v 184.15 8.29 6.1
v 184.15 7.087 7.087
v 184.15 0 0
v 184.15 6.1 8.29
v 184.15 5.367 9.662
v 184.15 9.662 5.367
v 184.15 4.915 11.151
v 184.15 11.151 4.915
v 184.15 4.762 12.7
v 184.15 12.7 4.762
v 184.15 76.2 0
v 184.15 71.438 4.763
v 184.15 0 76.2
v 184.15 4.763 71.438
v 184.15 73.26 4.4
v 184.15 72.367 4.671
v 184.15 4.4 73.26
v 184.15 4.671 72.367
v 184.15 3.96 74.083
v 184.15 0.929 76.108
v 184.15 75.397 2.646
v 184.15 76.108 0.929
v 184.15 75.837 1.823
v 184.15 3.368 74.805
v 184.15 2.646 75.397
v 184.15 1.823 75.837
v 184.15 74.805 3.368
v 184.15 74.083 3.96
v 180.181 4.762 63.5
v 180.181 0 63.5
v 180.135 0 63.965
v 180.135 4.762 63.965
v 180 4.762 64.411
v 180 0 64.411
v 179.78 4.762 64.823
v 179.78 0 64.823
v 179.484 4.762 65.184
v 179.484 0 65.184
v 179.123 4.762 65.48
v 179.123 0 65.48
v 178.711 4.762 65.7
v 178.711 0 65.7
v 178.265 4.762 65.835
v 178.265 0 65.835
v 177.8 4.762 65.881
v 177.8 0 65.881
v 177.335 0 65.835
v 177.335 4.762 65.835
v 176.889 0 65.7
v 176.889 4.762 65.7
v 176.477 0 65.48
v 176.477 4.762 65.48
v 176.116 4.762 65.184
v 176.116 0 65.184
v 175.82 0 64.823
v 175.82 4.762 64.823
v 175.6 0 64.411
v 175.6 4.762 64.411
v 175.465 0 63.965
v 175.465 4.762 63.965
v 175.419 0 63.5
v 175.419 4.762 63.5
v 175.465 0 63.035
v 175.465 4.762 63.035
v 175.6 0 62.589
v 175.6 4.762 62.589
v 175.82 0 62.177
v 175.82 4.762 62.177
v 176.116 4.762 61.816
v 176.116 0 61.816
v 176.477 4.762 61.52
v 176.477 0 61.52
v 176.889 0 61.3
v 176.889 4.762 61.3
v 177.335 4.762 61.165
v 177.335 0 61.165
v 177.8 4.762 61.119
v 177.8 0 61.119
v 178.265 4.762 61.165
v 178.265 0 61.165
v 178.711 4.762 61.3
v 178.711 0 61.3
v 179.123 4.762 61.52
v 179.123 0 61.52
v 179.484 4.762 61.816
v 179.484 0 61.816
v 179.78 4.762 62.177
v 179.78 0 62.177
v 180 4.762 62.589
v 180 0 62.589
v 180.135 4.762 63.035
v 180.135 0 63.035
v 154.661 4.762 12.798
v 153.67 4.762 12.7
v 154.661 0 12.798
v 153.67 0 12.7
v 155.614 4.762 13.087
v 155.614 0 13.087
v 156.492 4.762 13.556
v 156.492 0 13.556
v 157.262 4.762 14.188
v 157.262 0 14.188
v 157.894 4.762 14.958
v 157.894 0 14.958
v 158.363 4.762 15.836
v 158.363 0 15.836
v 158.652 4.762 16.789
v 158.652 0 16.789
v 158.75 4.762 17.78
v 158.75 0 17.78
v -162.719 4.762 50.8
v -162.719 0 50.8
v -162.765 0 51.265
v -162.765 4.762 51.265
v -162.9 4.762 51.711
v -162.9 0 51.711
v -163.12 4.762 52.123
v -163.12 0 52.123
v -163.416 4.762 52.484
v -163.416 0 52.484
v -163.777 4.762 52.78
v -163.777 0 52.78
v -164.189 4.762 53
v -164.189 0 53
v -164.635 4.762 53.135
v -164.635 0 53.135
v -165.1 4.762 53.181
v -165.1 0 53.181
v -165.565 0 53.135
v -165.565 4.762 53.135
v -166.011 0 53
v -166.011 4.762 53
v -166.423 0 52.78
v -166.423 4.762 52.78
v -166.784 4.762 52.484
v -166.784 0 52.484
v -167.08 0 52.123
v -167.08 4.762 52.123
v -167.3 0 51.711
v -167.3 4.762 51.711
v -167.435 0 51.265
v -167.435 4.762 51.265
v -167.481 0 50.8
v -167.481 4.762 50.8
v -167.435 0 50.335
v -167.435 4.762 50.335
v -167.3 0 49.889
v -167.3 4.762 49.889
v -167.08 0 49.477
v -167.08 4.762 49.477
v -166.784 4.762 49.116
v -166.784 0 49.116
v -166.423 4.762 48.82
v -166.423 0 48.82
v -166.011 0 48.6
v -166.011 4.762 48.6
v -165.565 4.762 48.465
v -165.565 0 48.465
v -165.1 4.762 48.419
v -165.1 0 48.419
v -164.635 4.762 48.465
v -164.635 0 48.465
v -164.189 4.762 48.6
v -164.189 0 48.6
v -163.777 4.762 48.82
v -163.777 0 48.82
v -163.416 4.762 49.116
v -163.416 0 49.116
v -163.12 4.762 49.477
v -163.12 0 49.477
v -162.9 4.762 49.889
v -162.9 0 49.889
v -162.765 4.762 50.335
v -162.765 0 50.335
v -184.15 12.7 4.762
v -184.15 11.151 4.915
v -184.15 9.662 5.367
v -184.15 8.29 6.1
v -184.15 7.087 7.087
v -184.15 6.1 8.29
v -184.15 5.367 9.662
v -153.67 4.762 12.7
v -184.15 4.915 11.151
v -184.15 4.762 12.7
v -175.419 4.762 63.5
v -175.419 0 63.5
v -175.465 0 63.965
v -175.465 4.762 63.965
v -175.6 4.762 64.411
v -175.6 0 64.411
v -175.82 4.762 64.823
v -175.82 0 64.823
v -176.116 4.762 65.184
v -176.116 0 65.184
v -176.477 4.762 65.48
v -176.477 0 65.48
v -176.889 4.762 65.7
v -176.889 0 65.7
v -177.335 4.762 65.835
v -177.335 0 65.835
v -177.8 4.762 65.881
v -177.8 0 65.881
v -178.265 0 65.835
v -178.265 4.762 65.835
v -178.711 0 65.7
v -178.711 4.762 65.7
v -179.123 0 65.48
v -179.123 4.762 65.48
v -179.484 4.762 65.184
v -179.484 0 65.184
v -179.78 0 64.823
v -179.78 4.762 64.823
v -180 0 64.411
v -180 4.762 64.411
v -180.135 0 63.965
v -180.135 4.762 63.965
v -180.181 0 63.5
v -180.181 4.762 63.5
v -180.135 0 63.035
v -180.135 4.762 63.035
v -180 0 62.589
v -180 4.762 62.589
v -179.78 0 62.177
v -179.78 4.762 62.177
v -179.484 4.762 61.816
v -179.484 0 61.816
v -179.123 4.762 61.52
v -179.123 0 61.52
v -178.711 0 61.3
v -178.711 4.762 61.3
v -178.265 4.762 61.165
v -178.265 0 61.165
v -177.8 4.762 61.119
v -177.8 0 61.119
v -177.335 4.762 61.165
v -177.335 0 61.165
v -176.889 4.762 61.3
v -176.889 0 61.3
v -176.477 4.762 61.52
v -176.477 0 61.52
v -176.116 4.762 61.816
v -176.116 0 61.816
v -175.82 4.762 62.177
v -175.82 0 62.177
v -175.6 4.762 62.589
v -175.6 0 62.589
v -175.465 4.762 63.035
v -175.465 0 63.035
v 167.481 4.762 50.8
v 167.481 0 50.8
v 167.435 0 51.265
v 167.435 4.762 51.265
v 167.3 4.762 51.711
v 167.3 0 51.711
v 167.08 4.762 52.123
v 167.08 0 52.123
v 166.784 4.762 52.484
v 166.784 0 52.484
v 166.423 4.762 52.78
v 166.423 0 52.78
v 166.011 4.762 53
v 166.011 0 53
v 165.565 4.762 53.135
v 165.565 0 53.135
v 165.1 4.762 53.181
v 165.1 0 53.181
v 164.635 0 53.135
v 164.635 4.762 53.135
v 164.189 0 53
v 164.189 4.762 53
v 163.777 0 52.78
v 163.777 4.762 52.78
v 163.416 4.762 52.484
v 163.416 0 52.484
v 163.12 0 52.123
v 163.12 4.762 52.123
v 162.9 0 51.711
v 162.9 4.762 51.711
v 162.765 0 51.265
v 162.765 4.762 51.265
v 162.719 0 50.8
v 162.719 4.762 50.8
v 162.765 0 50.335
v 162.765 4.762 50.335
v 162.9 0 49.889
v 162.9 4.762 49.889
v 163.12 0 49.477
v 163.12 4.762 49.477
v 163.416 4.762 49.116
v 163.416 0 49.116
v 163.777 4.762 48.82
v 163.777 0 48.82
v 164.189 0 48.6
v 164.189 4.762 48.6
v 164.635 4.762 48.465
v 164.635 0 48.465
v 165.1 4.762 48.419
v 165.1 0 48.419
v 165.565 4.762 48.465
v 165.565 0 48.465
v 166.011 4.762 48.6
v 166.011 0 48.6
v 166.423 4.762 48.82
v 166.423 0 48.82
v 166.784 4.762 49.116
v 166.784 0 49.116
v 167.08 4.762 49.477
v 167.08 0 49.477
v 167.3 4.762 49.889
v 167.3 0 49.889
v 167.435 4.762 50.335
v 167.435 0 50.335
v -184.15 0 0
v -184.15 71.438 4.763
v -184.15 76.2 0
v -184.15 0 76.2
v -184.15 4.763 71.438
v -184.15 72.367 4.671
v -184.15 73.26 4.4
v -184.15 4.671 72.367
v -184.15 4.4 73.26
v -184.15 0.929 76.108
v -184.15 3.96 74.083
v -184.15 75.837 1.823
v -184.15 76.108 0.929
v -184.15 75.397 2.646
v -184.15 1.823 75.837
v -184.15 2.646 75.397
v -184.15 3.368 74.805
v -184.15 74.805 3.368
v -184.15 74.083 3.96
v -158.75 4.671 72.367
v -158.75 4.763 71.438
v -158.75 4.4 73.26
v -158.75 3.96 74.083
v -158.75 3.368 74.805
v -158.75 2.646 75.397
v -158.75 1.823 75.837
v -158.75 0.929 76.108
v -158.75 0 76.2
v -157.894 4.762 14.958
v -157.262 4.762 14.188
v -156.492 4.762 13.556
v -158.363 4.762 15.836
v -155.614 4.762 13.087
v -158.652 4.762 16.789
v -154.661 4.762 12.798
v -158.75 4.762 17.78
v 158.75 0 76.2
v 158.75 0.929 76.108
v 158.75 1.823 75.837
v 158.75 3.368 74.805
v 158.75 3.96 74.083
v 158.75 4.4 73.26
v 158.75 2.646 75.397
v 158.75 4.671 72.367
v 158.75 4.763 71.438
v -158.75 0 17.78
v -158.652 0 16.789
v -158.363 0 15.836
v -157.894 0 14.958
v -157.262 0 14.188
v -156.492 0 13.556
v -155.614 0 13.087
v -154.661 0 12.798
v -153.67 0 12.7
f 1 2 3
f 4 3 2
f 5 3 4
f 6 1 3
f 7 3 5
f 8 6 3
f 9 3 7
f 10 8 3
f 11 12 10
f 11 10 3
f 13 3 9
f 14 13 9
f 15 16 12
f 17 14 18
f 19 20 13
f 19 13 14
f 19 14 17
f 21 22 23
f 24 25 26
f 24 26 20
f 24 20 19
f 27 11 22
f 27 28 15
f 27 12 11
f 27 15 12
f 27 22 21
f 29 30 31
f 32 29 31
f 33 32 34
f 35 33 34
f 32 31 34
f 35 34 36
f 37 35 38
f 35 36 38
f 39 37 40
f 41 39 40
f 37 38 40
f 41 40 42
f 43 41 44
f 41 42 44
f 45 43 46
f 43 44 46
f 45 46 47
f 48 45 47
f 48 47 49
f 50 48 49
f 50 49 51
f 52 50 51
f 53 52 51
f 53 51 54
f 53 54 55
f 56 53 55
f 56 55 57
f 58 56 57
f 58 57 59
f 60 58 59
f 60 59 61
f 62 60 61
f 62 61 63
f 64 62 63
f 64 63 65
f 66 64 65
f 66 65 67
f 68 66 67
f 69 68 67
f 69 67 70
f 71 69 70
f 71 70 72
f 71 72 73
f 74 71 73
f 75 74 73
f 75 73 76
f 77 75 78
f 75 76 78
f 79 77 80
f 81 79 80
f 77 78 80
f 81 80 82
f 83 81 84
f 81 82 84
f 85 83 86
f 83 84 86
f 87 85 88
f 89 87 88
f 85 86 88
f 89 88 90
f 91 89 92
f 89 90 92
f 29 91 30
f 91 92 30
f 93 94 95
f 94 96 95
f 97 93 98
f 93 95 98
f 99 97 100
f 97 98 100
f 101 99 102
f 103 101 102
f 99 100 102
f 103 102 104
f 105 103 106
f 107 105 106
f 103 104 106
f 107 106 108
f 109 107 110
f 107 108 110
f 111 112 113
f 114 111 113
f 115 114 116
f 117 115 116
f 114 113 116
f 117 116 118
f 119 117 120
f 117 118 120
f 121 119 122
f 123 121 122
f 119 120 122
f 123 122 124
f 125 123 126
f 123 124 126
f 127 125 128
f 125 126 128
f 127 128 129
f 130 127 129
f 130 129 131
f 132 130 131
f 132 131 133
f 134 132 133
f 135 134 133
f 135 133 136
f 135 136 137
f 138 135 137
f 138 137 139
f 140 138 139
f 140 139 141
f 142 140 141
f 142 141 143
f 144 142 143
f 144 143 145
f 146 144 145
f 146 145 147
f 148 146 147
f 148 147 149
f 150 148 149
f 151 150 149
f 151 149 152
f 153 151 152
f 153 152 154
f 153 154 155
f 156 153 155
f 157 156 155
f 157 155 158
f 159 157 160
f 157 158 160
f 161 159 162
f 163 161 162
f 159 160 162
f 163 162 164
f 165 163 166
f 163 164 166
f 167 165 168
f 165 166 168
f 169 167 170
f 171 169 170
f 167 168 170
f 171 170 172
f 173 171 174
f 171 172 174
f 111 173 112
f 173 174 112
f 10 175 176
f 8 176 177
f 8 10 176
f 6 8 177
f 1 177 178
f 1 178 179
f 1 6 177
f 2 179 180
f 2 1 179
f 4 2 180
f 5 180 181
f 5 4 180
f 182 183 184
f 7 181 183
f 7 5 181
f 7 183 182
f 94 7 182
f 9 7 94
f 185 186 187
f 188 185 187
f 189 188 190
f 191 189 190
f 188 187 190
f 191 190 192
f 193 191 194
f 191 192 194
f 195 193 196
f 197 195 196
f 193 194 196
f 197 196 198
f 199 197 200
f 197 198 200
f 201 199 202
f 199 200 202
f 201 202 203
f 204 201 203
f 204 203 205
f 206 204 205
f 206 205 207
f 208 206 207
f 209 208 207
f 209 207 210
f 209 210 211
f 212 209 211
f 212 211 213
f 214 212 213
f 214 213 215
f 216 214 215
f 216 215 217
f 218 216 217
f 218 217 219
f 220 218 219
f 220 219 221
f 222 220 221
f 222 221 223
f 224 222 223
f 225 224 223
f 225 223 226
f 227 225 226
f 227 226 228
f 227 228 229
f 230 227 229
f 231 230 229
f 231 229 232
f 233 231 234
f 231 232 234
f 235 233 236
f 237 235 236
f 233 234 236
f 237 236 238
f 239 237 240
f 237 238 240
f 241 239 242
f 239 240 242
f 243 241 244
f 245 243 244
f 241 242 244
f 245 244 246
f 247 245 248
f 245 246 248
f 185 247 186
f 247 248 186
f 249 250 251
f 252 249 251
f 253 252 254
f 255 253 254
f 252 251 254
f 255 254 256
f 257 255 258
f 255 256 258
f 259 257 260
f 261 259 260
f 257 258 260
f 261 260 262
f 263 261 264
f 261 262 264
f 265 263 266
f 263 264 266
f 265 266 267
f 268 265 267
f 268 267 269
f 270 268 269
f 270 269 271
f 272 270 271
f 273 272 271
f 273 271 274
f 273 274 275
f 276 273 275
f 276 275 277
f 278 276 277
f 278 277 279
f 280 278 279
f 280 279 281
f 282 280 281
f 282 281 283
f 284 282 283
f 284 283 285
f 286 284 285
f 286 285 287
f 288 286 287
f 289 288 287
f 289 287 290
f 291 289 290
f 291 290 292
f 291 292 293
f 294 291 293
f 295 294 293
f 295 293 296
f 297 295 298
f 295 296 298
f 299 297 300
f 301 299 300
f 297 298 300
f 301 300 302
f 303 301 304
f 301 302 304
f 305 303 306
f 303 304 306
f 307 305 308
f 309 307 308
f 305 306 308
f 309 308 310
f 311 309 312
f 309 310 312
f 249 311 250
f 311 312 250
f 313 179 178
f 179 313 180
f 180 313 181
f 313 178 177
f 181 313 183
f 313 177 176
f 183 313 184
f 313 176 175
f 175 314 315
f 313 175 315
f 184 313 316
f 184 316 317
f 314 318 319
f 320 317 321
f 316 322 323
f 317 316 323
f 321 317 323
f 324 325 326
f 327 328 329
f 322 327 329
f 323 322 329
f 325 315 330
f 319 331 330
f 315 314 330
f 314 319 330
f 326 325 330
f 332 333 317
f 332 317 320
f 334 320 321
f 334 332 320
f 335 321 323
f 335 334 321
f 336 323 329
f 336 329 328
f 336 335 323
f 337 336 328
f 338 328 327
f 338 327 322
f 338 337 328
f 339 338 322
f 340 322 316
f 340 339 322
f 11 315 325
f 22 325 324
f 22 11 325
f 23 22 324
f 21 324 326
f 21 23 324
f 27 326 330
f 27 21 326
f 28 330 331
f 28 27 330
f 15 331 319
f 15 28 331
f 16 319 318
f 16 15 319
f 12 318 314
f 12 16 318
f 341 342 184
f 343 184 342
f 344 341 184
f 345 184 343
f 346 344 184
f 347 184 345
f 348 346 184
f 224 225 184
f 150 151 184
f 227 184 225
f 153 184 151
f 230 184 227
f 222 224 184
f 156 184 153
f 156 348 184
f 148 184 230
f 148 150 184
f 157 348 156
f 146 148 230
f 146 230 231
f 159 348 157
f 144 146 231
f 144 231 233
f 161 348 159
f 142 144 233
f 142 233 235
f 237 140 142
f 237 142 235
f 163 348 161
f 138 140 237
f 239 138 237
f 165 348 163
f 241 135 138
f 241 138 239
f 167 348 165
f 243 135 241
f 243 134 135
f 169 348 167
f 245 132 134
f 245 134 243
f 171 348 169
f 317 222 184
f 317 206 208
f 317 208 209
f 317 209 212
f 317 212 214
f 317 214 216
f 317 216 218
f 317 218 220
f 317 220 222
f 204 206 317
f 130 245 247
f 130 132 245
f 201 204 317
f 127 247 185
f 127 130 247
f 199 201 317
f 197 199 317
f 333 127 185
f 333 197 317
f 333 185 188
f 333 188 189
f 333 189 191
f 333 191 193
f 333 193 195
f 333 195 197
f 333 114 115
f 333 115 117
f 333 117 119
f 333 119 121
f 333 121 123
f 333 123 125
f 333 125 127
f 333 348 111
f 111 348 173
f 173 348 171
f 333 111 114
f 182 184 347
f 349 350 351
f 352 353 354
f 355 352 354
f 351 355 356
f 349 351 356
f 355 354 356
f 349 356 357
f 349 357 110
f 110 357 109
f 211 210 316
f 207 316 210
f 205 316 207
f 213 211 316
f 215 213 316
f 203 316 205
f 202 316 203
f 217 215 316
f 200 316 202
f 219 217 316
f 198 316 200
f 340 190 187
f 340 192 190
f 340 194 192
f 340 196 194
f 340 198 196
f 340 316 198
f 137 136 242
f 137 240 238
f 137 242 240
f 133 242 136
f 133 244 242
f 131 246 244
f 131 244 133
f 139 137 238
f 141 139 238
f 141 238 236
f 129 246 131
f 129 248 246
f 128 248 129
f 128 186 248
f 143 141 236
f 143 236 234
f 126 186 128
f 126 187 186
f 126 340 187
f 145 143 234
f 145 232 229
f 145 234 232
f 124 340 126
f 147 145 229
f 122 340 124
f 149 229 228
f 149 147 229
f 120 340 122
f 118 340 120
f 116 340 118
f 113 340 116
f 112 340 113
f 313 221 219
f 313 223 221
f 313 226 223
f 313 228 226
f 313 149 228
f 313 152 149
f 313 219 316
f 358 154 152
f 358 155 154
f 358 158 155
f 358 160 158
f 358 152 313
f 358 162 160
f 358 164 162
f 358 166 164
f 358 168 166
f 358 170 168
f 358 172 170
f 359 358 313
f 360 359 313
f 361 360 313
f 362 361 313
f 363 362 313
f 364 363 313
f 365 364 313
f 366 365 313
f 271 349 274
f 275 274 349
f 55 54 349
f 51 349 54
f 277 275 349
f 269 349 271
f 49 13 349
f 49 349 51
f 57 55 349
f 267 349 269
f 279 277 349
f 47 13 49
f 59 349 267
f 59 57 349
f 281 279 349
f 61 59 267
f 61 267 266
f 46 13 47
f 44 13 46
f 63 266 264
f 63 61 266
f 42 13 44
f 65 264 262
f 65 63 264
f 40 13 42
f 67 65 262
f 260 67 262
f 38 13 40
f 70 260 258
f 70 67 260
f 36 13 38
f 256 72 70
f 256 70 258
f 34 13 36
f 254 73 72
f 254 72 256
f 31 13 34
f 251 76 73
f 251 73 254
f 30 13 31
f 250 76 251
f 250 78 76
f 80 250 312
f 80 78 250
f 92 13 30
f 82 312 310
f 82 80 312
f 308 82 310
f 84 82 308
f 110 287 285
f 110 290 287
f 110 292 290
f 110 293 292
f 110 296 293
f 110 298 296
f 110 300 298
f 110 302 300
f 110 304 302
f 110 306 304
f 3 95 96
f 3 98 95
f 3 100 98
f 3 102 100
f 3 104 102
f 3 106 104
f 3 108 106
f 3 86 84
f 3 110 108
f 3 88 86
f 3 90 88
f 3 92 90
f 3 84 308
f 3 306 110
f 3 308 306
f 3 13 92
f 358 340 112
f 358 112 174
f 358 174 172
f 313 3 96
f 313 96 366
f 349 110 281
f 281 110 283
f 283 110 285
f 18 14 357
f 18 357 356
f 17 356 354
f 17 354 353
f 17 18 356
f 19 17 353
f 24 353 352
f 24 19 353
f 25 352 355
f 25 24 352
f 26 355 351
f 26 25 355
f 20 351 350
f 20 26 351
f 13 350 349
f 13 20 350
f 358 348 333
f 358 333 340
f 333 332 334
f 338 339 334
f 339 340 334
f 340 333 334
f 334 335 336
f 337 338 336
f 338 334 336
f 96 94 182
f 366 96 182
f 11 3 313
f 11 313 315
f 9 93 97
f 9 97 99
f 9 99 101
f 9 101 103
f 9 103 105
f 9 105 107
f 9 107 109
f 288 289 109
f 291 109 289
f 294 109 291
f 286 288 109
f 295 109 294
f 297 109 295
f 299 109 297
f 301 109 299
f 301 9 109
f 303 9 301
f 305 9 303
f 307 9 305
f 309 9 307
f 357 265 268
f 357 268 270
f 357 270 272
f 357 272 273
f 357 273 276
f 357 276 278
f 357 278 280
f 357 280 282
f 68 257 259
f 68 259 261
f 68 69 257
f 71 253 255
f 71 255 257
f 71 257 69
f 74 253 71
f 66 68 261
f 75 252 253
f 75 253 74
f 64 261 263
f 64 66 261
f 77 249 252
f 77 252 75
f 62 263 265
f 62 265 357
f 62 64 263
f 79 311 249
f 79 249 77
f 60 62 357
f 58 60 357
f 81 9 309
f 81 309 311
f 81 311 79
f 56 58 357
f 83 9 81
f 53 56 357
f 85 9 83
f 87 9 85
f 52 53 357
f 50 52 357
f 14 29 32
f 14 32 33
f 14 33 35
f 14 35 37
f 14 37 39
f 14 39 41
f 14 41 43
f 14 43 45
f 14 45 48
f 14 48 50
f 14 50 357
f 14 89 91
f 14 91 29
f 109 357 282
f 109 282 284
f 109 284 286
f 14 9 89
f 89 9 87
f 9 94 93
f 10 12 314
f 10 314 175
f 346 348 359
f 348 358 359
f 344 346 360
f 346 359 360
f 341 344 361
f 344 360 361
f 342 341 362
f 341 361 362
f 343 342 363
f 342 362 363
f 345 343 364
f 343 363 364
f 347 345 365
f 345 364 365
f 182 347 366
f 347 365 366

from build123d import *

# Parameters (mm, degrees)
F1_DEPTH = 184.15
F2_W     = 317.5
F2_H     = 68.2625
F2_H_2   = 58.7375
F3_DEPTH = 4.7635
F4_R     = 5.08
F5_R     = 2.38125
F6_DEPTH = 76.201


with BuildPart() as f1:
    # F0 (on Right) → F1 (new body, symmetric)
    with BuildSketch(Plane.YZ):
        with BuildLine():
            ThreePointArc((4.7625, 71.4375), (3.3675960454, 74.8050960454), (0, 76.2))
            Line((0, 76.2), (0, 0))
            Line((0, 0), (76.2, 0))
            ThreePointArc((76.2, 0), (74.8050960454, 3.3675960454), (71.4375, 4.7625))
            Line((71.4375, 4.7625), (12.7, 4.7625))
            ThreePointArc((12.7, 4.7625), (7.0873399243, 7.0873399243), (4.7625, 12.7))
            Line((4.7625, 12.7), (4.7625, 71.4375))
        make_face()
    extrude(amount=F1_DEPTH, both=True)

    # F2 (on face) → F3 (cut, through all)
    with BuildSketch(Plane(origin=(0, 4.7625, 0), x_dir=(-1, 0, 0), z_dir=(0, 1, 0))):
        with Locations((0, 105.56875)):
            Rectangle(F2_W, F2_H)
        with Locations((0, 42.06875)):
            Rectangle(F2_W, F2_H_2)
    extrude(amount=-F3_DEPTH, mode=Mode.SUBTRACT)

    # F4
    f4_edges = [f1.edges().sort_by_distance(p)[0] for p in [
        (158.75, 2.38125, 12.7),
        (-158.75, 2.38125, 12.7),
    ]]
    fillet(f4_edges, radius=F4_R)

    # F5 (on face) → F6 (cut, through all)
    with BuildSketch(Plane.XZ):
        with Locations((-165.1, 50.8)):
            Circle(F5_R)
        with Locations((-177.8, 63.5)):
            Circle(F5_R)
        with Locations((177.8, 63.5)):
            Circle(F5_R)
        with Locations((165.1, 50.8)):
            Circle(F5_R)
    extrude(amount=-F6_DEPTH, mode=Mode.SUBTRACT)


solid = f1.part
